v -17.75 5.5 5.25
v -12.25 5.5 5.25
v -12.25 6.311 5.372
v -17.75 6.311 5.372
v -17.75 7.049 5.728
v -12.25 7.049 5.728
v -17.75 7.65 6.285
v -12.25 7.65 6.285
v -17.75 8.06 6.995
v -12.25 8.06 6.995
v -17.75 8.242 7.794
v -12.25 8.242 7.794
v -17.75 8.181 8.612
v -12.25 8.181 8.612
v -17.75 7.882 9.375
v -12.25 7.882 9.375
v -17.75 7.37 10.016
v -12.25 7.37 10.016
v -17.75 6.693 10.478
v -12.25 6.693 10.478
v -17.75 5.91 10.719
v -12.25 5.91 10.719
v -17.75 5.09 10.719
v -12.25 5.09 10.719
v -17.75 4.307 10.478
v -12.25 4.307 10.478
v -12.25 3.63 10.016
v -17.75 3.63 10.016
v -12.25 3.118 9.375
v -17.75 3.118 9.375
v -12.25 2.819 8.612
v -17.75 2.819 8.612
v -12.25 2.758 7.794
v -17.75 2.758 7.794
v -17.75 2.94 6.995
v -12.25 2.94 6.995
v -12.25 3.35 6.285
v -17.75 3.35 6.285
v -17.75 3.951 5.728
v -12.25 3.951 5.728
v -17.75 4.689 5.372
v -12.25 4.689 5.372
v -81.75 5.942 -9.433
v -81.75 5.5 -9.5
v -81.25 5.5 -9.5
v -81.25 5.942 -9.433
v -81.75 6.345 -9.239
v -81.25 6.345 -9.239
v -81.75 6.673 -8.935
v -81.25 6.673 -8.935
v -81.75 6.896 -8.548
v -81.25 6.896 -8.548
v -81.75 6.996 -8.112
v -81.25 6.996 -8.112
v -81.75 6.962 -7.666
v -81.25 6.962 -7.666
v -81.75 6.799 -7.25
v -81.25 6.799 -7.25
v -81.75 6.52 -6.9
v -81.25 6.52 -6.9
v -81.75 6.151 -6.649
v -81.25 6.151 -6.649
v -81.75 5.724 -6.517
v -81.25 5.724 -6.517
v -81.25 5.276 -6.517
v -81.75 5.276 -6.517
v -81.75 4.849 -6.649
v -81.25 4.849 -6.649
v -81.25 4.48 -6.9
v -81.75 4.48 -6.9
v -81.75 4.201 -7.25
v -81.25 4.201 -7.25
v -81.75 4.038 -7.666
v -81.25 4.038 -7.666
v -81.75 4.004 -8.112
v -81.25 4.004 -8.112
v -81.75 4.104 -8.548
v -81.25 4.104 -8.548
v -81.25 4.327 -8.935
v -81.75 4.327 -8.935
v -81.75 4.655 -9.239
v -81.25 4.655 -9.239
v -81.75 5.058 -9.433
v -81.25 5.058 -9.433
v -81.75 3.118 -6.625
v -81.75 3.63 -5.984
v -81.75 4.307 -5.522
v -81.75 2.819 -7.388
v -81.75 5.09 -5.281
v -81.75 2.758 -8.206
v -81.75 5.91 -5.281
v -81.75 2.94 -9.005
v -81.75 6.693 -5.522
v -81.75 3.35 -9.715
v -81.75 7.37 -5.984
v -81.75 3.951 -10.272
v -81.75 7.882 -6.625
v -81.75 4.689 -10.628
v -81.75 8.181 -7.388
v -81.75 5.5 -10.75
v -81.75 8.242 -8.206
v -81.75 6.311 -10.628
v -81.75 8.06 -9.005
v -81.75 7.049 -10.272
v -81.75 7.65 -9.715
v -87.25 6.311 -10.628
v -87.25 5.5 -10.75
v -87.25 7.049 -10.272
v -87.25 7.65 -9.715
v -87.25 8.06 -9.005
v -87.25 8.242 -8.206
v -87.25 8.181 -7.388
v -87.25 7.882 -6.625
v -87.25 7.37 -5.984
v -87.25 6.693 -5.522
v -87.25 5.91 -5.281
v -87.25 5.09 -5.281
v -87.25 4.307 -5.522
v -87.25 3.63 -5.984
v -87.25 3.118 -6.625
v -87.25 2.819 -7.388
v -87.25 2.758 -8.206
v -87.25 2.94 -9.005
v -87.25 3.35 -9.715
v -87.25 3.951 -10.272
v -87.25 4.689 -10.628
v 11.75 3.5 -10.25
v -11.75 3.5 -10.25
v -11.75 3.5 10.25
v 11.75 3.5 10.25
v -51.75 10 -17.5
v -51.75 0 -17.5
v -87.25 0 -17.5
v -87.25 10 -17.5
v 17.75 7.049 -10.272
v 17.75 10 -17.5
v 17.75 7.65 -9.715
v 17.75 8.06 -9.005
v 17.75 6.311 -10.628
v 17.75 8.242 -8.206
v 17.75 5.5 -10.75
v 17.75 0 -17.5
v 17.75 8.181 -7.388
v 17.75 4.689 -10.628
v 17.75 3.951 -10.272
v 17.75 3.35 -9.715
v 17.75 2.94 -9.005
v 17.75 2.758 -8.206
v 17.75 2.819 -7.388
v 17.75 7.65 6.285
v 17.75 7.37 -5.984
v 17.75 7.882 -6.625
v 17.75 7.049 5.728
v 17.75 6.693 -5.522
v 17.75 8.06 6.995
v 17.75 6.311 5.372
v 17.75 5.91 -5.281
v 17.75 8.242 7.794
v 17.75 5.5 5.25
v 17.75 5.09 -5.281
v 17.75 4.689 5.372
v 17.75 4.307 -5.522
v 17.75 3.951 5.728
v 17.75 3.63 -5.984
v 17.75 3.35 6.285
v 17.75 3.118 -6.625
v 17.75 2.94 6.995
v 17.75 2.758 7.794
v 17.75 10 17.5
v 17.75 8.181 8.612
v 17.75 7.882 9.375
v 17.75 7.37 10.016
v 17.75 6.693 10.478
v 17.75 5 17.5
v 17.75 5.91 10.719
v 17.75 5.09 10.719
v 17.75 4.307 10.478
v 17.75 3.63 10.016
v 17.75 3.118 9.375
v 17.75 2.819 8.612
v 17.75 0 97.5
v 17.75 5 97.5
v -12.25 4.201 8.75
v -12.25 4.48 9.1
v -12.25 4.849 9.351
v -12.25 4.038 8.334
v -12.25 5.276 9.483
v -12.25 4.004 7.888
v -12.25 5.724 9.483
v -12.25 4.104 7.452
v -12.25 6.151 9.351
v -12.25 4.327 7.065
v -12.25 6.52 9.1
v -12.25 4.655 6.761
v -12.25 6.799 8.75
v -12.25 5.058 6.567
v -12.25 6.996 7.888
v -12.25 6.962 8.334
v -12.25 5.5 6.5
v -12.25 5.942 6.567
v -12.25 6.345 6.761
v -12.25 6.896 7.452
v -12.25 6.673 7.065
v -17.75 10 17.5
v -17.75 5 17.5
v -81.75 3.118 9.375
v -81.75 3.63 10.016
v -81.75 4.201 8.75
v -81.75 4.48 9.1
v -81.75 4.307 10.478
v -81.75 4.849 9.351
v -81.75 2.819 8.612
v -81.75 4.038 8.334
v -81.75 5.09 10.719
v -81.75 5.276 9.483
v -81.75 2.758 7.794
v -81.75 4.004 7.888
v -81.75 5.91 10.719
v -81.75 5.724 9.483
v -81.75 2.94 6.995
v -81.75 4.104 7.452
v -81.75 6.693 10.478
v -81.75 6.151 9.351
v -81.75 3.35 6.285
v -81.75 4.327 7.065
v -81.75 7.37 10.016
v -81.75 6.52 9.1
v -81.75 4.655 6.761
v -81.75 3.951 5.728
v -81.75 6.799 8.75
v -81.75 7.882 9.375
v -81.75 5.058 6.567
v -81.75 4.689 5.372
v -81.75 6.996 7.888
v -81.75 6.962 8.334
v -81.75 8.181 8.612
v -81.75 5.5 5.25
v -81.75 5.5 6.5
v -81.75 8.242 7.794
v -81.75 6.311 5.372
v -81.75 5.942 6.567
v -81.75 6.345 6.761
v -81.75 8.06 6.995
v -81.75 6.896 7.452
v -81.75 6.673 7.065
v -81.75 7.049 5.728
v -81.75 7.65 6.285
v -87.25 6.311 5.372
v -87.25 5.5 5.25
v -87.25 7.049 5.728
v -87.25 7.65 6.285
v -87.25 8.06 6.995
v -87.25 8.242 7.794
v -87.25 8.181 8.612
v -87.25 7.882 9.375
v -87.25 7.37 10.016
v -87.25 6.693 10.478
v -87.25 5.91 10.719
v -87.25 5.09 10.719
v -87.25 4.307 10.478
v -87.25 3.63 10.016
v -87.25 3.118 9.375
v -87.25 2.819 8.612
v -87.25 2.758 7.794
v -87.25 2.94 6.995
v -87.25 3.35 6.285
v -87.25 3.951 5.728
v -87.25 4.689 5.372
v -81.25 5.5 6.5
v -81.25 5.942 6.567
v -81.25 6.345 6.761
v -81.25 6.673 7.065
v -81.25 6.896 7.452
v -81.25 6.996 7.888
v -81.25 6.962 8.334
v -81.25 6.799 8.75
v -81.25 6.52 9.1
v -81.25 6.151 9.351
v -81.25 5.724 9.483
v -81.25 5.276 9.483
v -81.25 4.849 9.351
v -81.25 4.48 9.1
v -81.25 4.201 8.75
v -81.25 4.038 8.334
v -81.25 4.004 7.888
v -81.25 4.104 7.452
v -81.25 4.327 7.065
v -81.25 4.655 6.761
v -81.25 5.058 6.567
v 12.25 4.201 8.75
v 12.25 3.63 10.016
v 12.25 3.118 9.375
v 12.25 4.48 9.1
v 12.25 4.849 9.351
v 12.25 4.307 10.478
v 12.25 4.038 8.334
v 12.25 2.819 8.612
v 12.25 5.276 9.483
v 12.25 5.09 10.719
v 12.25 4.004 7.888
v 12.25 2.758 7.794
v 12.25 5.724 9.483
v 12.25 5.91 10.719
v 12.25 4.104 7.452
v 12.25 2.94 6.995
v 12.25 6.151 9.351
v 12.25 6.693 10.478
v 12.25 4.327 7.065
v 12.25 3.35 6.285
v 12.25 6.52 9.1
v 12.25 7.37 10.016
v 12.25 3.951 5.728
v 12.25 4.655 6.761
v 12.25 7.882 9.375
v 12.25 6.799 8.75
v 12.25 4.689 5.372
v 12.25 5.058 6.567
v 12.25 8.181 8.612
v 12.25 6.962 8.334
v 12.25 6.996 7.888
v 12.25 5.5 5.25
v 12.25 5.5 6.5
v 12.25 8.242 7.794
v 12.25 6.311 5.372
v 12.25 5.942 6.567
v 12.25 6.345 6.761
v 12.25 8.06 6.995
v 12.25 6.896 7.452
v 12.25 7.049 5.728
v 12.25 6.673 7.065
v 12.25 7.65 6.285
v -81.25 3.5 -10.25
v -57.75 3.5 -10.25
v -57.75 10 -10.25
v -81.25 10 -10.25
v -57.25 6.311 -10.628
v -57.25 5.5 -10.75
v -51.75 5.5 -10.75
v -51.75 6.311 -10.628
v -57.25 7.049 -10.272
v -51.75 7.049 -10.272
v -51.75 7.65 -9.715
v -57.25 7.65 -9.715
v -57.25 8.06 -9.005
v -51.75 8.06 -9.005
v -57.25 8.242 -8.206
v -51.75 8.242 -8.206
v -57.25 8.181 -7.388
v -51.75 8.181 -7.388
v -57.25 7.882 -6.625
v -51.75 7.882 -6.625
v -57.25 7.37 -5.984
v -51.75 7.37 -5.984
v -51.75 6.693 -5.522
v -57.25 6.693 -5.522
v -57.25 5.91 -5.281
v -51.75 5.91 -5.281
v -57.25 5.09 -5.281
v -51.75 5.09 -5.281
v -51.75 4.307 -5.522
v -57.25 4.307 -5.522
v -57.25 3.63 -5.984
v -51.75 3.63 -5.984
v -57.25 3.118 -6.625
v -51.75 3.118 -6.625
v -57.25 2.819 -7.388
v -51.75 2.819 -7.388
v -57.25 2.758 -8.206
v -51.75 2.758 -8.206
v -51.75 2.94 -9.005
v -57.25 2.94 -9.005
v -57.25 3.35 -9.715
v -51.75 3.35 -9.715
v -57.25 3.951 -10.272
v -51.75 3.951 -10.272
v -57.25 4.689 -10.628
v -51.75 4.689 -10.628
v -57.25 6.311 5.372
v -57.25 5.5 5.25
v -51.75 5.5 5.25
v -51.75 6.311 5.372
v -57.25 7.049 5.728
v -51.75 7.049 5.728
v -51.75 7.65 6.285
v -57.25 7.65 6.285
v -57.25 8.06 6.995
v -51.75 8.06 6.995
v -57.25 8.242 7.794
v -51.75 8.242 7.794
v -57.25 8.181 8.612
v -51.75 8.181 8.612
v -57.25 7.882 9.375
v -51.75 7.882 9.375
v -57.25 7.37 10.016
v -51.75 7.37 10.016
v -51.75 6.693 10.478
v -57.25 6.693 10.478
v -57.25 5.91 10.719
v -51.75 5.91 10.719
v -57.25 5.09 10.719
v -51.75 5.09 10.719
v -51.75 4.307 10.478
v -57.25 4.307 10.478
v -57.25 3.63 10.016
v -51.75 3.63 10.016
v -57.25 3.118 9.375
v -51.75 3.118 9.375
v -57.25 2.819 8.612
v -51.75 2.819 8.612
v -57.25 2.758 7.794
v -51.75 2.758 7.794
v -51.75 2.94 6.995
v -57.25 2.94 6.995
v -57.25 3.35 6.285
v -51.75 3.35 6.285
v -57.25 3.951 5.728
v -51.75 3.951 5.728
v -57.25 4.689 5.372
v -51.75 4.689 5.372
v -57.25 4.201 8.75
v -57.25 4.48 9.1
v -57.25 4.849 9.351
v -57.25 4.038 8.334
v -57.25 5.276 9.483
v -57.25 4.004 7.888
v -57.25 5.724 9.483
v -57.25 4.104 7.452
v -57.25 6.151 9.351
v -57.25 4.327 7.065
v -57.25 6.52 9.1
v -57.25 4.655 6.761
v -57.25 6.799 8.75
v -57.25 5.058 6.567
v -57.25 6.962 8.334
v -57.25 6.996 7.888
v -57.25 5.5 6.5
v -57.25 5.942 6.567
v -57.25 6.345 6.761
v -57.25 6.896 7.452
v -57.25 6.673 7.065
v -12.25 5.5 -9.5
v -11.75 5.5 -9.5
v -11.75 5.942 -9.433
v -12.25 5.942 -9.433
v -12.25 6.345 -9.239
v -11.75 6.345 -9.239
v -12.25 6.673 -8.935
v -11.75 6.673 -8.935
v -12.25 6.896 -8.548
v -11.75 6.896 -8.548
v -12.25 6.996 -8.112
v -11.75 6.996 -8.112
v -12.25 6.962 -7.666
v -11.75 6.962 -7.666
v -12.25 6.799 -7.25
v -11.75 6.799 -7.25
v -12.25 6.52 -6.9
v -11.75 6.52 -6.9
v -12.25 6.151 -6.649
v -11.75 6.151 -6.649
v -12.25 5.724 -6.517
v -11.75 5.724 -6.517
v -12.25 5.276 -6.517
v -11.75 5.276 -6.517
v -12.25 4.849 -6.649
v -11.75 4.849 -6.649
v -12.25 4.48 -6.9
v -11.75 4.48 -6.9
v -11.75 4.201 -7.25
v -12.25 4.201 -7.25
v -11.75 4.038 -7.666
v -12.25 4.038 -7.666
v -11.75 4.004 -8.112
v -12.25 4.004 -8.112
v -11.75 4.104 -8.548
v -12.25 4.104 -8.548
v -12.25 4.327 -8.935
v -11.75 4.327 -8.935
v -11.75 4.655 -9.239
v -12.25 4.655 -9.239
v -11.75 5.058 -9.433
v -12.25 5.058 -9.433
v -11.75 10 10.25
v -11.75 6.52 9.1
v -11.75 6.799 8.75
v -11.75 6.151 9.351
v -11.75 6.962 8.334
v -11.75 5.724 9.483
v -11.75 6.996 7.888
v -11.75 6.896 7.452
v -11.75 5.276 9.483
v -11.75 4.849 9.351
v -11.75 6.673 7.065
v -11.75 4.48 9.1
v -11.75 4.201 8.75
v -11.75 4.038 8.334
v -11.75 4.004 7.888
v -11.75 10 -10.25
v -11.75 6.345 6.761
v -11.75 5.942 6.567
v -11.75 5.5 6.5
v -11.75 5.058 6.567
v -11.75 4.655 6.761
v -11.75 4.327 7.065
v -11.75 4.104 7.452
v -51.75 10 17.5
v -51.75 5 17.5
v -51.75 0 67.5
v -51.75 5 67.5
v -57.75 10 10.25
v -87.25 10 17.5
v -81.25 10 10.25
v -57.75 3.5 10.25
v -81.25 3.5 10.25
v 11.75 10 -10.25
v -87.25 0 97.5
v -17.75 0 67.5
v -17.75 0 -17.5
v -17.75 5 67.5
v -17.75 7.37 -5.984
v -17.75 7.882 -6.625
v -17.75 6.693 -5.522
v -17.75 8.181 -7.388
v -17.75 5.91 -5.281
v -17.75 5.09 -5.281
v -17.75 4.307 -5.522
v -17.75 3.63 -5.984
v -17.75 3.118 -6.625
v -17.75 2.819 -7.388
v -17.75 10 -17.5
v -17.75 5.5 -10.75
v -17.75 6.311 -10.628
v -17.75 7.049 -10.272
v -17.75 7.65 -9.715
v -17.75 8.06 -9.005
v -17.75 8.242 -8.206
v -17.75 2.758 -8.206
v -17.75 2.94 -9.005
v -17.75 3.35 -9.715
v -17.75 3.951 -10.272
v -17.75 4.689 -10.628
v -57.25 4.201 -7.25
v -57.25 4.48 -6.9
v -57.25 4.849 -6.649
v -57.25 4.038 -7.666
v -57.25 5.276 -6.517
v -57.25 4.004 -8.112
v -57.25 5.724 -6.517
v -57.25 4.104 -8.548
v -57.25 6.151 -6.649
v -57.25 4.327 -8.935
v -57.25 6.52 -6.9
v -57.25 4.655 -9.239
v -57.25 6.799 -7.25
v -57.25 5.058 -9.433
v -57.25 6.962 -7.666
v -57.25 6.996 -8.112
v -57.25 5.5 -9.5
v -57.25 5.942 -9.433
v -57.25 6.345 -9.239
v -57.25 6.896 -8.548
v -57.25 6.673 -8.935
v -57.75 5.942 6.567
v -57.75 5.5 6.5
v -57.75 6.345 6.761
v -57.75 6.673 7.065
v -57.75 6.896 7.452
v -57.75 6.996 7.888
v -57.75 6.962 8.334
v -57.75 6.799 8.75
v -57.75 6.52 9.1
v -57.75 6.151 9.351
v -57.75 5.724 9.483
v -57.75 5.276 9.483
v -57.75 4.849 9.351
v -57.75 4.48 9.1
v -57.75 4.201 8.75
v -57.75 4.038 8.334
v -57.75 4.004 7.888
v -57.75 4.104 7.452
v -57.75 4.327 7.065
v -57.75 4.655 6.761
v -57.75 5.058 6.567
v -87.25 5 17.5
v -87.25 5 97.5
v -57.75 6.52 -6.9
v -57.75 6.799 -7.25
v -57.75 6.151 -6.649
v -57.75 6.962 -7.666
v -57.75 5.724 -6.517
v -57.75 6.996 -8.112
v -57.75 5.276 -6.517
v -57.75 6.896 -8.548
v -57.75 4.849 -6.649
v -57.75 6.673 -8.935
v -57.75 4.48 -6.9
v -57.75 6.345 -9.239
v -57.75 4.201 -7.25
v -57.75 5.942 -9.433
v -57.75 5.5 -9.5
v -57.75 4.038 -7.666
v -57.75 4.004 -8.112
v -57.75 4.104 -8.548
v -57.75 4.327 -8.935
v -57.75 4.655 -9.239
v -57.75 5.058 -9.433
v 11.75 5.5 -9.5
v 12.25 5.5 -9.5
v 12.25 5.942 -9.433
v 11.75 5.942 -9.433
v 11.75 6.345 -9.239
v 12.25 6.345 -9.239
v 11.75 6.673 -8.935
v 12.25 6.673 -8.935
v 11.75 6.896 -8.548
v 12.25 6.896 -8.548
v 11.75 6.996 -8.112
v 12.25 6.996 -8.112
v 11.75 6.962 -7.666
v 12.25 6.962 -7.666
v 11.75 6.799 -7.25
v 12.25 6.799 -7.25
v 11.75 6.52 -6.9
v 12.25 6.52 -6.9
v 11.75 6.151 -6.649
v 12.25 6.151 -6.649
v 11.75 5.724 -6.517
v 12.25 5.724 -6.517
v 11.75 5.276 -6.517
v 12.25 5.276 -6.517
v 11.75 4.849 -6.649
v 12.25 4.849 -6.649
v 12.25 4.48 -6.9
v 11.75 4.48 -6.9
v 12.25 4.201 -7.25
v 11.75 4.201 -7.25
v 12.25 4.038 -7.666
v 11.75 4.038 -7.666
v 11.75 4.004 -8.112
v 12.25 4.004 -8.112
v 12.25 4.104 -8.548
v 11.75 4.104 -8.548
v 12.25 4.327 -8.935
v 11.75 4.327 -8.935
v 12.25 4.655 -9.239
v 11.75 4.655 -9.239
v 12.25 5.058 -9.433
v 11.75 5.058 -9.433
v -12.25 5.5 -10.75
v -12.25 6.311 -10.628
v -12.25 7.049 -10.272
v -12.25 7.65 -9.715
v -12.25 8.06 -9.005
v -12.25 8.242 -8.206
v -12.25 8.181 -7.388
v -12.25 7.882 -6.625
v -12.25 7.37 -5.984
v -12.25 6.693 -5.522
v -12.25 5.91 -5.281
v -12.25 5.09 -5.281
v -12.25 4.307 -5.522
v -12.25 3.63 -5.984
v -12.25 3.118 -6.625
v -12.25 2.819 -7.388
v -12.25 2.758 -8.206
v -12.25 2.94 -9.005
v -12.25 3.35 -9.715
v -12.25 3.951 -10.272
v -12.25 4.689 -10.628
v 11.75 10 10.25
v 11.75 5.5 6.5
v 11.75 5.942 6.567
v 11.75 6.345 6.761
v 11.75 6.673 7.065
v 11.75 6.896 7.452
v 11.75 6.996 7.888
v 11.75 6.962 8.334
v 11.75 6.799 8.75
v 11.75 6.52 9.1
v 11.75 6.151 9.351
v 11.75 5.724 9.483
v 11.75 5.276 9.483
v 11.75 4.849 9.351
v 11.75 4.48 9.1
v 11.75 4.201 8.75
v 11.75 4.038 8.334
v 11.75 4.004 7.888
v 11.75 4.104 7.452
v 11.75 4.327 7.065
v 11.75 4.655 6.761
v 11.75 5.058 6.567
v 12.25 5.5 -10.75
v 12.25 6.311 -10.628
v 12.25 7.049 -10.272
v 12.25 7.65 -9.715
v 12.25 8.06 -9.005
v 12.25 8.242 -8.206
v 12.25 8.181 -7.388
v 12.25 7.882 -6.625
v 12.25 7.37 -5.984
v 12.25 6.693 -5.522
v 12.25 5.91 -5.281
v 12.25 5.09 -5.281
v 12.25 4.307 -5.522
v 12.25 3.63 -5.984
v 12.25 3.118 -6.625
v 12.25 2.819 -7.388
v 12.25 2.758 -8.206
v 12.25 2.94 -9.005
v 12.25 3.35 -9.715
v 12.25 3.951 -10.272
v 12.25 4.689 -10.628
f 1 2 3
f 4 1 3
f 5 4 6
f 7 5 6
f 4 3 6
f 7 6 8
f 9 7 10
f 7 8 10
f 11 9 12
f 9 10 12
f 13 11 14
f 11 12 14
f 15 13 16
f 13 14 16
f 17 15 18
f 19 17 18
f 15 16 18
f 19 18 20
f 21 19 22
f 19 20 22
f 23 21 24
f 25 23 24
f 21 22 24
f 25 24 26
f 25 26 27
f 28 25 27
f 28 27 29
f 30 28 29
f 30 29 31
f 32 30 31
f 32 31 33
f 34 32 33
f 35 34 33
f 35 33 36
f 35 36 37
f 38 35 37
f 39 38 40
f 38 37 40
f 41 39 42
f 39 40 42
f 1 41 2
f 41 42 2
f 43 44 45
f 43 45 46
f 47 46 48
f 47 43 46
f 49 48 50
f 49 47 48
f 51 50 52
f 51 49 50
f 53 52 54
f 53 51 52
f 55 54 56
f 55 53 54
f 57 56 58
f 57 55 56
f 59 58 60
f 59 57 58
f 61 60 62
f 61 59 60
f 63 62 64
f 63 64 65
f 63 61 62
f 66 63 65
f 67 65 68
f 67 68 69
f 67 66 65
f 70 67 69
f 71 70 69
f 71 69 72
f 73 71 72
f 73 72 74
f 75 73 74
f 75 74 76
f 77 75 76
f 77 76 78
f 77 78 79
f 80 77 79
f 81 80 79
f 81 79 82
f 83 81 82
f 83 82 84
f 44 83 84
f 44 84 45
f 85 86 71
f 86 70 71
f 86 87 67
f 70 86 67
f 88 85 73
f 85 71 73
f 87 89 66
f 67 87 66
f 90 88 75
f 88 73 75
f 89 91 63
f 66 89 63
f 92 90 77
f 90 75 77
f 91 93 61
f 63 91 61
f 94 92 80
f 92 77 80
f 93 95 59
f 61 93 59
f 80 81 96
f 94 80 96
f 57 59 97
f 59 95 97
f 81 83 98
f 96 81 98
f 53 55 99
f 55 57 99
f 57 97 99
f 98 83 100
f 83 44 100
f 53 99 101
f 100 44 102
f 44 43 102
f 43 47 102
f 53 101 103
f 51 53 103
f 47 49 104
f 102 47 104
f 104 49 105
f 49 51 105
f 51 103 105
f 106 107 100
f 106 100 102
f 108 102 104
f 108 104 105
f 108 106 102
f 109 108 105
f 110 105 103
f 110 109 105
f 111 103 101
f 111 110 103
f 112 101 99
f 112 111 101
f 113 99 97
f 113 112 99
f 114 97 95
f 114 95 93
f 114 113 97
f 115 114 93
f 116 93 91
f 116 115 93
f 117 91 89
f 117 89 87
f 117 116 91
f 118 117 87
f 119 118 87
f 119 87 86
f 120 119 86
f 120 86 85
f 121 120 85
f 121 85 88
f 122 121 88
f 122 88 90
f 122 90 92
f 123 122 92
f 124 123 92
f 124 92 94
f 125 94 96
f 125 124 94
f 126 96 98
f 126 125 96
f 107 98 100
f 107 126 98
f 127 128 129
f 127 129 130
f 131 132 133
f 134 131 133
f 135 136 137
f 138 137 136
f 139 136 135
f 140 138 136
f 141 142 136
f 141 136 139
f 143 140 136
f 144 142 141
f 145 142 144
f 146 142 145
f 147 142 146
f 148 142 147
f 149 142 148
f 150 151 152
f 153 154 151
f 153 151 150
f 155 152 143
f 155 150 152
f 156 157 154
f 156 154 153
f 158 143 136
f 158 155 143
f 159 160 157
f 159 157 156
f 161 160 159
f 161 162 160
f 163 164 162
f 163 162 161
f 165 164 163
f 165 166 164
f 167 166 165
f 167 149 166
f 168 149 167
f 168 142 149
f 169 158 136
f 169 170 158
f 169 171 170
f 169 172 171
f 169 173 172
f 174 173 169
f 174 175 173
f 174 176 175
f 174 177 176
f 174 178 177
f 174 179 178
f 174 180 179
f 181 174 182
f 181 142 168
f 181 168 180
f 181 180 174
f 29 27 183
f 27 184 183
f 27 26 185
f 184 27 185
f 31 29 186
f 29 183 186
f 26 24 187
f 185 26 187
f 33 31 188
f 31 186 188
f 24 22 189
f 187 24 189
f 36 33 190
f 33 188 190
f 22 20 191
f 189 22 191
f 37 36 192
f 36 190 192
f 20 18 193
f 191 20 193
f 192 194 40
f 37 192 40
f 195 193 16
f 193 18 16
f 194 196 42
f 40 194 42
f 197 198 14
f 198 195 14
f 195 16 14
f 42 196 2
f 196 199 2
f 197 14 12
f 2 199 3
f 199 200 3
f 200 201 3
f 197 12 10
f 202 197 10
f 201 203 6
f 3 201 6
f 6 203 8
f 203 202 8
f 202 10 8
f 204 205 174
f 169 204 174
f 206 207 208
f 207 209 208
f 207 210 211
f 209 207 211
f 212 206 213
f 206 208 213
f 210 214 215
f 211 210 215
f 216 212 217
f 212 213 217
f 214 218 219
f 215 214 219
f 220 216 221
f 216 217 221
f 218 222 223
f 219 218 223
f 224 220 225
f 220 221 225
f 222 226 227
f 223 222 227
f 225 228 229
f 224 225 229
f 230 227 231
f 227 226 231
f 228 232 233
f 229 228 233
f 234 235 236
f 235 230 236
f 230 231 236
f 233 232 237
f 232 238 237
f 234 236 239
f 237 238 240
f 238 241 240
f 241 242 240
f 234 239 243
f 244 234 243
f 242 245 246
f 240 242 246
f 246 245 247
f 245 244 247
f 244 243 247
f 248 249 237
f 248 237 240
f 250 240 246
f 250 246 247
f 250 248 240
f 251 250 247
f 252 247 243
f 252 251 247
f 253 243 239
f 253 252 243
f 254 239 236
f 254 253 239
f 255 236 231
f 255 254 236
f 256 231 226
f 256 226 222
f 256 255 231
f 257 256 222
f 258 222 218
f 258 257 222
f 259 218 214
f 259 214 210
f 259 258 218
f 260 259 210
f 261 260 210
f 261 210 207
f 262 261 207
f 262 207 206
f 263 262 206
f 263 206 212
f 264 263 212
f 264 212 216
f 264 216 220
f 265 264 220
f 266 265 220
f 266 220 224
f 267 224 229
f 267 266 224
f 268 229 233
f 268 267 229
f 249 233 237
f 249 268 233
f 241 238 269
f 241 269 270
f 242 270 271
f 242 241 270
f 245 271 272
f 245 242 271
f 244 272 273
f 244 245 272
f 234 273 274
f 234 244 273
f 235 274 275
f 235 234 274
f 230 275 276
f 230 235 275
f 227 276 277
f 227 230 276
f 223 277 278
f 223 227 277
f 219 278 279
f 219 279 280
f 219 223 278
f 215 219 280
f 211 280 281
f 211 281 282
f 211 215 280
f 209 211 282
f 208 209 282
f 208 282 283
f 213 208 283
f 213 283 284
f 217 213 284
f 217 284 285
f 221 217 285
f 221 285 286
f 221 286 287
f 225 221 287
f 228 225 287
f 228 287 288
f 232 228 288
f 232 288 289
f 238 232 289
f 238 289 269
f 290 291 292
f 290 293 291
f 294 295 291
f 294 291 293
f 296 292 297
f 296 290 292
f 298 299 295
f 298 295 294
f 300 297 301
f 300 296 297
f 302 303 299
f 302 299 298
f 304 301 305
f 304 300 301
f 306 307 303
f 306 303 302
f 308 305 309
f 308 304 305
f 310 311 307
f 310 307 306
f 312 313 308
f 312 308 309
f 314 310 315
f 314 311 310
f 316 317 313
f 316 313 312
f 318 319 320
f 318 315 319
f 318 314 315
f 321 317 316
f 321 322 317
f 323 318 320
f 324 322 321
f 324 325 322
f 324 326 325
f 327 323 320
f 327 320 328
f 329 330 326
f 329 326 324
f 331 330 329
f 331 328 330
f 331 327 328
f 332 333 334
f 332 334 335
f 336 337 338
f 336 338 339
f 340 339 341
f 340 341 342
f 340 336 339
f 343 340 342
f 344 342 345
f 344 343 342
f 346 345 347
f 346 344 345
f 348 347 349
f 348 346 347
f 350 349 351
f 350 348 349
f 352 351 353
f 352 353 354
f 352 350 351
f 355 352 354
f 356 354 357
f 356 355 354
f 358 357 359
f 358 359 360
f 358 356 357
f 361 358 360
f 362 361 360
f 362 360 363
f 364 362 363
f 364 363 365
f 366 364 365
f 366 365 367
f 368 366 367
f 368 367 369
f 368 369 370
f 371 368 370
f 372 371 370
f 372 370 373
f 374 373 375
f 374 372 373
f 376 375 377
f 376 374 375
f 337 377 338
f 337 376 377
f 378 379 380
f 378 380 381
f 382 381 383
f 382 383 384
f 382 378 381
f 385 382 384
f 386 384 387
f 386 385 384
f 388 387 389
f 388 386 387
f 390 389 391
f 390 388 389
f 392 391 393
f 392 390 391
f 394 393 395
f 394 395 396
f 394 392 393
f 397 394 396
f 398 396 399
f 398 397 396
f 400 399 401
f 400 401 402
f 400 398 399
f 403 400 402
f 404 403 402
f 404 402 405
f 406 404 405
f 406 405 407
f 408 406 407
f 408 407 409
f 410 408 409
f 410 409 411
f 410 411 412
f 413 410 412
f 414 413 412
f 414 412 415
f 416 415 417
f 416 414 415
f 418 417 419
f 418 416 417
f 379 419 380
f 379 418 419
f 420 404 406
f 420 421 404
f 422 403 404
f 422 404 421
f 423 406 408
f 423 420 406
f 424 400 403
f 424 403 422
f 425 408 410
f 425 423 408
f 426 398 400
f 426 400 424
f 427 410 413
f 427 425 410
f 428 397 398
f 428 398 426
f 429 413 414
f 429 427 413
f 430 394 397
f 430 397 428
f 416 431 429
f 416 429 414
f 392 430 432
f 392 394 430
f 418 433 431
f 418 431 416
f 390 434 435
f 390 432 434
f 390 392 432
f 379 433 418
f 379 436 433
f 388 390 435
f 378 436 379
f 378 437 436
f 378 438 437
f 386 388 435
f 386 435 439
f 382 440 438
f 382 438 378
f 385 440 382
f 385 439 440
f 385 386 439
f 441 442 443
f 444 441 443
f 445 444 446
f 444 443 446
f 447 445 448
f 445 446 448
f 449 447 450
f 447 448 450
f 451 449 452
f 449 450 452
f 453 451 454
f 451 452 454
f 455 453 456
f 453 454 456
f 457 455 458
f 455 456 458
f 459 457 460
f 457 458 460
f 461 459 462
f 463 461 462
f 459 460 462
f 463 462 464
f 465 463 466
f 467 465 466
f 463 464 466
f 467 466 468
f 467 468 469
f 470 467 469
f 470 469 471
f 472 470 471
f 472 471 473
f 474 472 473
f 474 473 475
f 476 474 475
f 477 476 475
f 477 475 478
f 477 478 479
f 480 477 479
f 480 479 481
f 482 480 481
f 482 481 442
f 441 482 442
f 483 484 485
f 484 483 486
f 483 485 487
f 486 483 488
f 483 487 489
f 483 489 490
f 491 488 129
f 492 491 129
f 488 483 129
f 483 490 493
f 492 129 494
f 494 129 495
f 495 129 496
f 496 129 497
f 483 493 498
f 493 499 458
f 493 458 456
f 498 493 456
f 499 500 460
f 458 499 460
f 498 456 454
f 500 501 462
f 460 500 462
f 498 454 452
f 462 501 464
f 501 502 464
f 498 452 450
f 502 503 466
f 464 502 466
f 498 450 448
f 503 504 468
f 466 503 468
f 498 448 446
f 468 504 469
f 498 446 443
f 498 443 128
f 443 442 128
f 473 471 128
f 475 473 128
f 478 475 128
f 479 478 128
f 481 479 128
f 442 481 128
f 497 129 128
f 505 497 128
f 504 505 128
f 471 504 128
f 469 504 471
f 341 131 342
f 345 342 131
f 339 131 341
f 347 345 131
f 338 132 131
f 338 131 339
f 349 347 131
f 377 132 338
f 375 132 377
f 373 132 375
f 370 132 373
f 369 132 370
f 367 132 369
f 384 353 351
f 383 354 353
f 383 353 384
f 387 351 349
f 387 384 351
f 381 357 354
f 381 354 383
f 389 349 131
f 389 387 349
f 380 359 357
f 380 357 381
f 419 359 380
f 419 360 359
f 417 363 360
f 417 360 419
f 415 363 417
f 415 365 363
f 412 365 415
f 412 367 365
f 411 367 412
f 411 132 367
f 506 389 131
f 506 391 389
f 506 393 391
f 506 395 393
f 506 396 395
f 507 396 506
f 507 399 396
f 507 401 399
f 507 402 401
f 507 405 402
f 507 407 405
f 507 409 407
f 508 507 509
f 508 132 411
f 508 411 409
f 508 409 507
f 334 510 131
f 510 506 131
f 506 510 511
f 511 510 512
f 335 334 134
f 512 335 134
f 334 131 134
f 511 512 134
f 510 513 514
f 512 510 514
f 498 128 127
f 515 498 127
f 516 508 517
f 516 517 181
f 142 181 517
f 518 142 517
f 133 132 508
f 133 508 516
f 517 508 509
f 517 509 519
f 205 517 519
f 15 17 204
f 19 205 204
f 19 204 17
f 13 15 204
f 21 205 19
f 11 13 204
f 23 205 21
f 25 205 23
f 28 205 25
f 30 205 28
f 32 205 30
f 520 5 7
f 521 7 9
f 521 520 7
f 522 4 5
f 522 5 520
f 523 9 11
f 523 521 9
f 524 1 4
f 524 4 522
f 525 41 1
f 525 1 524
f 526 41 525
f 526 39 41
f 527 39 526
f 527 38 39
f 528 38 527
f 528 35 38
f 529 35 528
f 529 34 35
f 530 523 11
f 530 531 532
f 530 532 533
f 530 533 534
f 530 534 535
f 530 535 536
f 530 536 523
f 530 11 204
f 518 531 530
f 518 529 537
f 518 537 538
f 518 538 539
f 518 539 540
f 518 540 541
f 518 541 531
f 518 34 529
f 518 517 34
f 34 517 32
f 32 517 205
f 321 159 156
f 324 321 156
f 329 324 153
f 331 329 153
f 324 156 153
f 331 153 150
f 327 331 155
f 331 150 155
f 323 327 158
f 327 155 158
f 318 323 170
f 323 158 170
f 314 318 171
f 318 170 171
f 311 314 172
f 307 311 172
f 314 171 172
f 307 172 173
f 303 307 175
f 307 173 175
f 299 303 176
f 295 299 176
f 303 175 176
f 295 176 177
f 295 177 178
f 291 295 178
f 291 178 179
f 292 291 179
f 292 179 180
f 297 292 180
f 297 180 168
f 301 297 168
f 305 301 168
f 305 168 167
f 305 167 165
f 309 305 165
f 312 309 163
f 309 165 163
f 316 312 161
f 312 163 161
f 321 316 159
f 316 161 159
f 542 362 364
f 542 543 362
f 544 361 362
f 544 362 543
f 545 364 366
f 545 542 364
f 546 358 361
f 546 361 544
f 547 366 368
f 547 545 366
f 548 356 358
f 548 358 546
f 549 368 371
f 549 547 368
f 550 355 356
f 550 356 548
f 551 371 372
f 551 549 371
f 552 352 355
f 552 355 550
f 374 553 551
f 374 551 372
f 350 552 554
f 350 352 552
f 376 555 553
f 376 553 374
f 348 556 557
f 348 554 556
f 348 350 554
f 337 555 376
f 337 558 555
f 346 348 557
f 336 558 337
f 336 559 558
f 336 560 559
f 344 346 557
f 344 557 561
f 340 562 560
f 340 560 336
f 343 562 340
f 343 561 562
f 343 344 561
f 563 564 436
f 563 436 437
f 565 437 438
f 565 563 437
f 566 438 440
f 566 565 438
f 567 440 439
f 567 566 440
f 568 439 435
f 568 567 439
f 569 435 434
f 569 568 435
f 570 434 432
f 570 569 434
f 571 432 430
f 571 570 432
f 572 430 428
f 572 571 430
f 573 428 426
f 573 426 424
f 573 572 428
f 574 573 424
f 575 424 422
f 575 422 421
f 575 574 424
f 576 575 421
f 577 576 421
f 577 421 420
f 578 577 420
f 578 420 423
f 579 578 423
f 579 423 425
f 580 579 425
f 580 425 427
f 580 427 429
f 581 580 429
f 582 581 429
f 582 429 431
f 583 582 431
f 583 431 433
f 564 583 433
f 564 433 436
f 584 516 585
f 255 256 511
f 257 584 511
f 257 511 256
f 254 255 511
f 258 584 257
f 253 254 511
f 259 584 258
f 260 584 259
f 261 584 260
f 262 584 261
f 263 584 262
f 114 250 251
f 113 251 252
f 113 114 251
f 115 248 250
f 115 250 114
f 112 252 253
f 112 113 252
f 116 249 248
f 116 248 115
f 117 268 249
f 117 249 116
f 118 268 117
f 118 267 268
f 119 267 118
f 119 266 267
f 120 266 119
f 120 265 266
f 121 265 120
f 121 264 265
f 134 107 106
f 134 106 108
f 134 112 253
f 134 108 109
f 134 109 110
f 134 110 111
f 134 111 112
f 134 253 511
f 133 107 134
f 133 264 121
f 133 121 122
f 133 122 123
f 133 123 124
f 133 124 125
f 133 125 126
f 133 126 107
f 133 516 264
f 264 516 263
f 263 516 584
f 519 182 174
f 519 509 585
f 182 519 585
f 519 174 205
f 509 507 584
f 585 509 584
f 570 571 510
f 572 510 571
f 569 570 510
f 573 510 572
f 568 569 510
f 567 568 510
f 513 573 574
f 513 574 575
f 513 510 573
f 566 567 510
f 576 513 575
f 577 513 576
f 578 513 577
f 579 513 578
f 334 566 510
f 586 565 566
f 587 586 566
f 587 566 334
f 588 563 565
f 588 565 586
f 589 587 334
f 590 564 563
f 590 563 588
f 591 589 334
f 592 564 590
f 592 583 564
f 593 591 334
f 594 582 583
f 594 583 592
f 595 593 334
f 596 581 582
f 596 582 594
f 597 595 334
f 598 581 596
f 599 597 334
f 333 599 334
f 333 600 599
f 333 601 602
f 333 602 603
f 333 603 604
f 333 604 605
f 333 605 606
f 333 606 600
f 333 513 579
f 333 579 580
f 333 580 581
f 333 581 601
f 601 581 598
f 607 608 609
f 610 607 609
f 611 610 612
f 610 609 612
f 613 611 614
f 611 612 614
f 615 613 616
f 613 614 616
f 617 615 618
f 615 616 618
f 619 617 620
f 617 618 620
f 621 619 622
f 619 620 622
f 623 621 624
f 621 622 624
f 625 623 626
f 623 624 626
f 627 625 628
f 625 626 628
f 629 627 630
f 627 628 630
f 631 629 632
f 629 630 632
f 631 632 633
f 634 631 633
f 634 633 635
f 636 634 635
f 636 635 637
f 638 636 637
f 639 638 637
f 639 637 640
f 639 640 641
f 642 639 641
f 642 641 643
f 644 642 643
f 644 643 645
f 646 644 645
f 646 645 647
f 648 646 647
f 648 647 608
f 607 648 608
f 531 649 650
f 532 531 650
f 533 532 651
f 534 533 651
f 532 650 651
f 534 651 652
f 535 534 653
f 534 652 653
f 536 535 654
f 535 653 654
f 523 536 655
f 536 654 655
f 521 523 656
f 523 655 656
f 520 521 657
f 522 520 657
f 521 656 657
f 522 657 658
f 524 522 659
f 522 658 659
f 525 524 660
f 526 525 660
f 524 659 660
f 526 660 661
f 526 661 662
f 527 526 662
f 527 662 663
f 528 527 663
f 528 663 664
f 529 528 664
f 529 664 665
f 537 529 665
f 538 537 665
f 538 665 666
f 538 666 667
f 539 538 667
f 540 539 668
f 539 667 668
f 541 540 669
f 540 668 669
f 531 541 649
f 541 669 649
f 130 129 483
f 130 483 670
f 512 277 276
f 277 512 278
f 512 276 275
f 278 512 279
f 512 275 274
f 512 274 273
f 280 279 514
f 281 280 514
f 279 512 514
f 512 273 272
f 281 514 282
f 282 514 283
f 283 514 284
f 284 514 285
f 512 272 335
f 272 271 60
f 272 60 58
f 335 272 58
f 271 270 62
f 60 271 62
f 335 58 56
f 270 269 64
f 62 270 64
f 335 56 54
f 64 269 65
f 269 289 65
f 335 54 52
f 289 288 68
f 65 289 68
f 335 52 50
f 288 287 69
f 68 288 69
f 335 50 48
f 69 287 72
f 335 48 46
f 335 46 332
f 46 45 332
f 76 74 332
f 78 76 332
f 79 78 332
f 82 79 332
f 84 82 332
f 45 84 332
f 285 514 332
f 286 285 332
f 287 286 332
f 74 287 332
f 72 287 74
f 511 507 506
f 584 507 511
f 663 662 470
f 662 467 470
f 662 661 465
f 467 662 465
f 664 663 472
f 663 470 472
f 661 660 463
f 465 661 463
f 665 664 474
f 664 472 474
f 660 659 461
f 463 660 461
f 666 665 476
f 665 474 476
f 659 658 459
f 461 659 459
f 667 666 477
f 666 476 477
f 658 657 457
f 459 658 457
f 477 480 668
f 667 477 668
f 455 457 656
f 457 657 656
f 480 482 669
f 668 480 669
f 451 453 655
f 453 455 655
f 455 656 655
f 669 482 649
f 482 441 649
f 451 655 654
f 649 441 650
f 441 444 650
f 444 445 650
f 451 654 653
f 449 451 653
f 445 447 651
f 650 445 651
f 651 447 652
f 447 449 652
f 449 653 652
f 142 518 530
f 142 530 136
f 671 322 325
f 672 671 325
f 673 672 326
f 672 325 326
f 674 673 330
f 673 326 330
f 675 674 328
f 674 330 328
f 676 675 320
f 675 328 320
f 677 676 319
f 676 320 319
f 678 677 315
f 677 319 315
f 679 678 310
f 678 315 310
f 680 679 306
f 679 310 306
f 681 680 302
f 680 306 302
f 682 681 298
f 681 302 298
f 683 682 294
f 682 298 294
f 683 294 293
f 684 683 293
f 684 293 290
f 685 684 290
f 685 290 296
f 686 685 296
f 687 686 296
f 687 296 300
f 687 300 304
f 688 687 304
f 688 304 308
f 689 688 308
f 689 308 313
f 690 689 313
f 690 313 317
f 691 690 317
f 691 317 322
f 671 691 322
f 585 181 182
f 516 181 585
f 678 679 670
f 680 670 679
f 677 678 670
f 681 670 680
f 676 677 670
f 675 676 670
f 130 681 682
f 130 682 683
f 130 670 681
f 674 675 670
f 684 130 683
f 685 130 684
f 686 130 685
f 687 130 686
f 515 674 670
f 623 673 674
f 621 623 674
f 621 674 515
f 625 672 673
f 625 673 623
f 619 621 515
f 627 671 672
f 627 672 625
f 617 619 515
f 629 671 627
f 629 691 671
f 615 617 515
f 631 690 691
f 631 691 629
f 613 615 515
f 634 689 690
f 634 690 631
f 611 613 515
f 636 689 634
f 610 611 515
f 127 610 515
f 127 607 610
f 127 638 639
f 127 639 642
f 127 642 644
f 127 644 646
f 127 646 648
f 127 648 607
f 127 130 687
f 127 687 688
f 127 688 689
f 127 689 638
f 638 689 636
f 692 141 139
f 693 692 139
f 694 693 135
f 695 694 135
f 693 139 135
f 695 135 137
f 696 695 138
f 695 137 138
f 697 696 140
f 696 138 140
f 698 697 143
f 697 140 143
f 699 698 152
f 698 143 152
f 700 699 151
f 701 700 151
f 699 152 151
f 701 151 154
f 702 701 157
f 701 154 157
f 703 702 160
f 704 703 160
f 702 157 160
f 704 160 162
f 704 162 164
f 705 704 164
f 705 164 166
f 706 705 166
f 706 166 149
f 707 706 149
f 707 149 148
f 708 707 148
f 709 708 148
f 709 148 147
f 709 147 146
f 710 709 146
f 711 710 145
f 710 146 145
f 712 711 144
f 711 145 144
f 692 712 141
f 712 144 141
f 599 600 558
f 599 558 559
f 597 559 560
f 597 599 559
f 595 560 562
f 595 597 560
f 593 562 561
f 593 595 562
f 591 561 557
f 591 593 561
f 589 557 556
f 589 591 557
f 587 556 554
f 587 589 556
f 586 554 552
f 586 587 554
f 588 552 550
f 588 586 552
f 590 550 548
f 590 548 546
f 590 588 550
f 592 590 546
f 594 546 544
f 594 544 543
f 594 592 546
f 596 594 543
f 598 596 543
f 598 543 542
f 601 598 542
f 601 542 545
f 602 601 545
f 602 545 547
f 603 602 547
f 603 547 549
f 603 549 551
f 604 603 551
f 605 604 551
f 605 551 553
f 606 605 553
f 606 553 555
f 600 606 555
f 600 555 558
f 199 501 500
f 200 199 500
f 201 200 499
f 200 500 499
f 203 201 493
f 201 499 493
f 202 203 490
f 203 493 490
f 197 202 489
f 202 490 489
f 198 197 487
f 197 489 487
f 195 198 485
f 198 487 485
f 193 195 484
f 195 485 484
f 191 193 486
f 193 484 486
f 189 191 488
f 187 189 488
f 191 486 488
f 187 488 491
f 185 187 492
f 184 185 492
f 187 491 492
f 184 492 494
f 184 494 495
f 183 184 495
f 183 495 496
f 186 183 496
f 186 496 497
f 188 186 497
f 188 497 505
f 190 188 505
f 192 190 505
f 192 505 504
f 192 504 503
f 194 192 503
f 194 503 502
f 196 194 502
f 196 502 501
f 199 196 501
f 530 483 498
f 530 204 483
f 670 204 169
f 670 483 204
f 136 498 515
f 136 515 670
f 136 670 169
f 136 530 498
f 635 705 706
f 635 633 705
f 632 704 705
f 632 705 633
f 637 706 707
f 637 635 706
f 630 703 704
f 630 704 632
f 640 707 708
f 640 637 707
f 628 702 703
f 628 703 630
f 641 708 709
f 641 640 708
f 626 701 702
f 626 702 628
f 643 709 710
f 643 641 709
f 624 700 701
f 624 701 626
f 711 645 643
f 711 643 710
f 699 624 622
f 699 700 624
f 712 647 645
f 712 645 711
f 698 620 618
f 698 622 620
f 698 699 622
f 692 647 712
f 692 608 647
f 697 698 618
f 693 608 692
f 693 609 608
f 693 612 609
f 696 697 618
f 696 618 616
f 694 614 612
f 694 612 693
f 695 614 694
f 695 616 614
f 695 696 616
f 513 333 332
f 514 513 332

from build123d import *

# Parameters (mm, degrees)
SKETCH1_W           = 35.5
SKETCH1_H           = 35
SKETCH1_W_2         = 23.5
SKETCH1_H_2         = 20.5
BOSS_EXTRUDE1_DEPTH = 10
SKETCH1_2_W         = 23.5
SKETCH1_2_H         = 20.5
BOSS_EXTRUDE2_DEPTH = 3.5
SKETCH2_R           = 2.75
SKETCH2_R_2         = 1.5
CUT_EXTRUDE1_DEPTH  = 5.5
SKETCH2_2_R         = 1.5
CUT_EXTRUDE2_DEPTH  = 41.822787754
CUT_EXTRUDE3_START  = -30
SKETCH2_3_R         = 2.75
SKETCH2_3_R_2       = 1.5
CUT_EXTRUDE3_DEPTH  = 5.5
BOSS_EXTRUDE3_DEPTH = 5


with BuildPart() as part:
    # Sketch1 → Boss-Extrude1 (new body)
    with BuildSketch(Plane(origin=(0, 0, 0), x_dir=(1, 0, 0), z_dir=(0, 1, 0))):
        Rectangle(SKETCH1_W, SKETCH1_H)
        Rectangle(SKETCH1_W_2, SKETCH1_H_2, mode=Mode.SUBTRACT)
    extrude(amount=BOSS_EXTRUDE1_DEPTH)

    # Sketch1<2> → Boss-Extrude2 (add)
    with BuildSketch(Plane(origin=(0, 0, 0), x_dir=(1, 0, 0), z_dir=(0, 1, 0))):
        Rectangle(SKETCH1_2_W, SKETCH1_2_H)
    extrude(amount=BOSS_EXTRUDE2_DEPTH)

    # Sketch2 → Cut-Extrude1 (cut)
    # profile 1 of 2: a face of its own
    with BuildSketch(Plane(origin=(17.75, 0, 0), x_dir=(0, 0, -1), z_dir=(1, 0, 0))):
        with Locations((-8, 5.5)):
            Circle(SKETCH2_R)
        with Locations((-8, 5.5)):
            Circle(SKETCH2_R_2, mode=Mode.SUBTRACT)
    # profile 2 of 2: a face of its own
    with BuildSketch(Plane(origin=(17.75, 0, 0), x_dir=(0, 0, -1), z_dir=(1, 0, 0))):
        with Locations((8, 5.5)):
            Circle(SKETCH2_R)
        with Locations((8, 5.5)):
            Circle(SKETCH2_R_2, mode=Mode.SUBTRACT)
    extrude(amount=-CUT_EXTRUDE1_DEPTH, mode=Mode.SUBTRACT)

    # Sketch2<2> → Cut-Extrude2 (cut, through all)
    with BuildSketch(Plane(origin=(17.75, 0, 0), x_dir=(0, 0, -1), z_dir=(1, 0, 0))):
        with Locations((-8, 5.5)):
            Circle(SKETCH2_2_R)
        with Locations((8, 5.5)):
            Circle(SKETCH2_2_R)
    extrude(amount=-CUT_EXTRUDE2_DEPTH, mode=Mode.SUBTRACT)

    # Sketch2<3> → Cut-Extrude3 (cut)
    # profile 1 of 2: a face of its own
    with BuildSketch(Plane(origin=(17.75, 0, 0), x_dir=(0, 0, -1), z_dir=(1, 0, 0)).offset(CUT_EXTRUDE3_START)):
        with Locations((-8, 5.5)):
            Circle(SKETCH2_3_R)
        with Locations((-8, 5.5)):
            Circle(SKETCH2_3_R_2, mode=Mode.SUBTRACT)
    # profile 2 of 2: a face of its own
    with BuildSketch(Plane(origin=(17.75, 0, 0), x_dir=(0, 0, -1), z_dir=(1, 0, 0)).offset(CUT_EXTRUDE3_START)):
        with Locations((8, 5.5)):
            Circle(SKETCH2_3_R)
        with Locations((8, 5.5)):
            Circle(SKETCH2_3_R_2, mode=Mode.SUBTRACT)
    extrude(amount=-CUT_EXTRUDE3_DEPTH, mode=Mode.SUBTRACT)


with BuildPart() as body_2:
    # Mirror1: mirrored copy
    add(part.part.mirror(Plane.ZY.offset(34.75)))


with BuildPart() as part_1:
    add(part.part)

    add(body_2.part)  # Boss-Extrude3 merges body 2
    # Sketch4 → Boss-Extrude3 (add)
    with BuildSketch(Plane(origin=(0, 0, 0), x_dir=(1, 0, 0), z_dir=(0, 1, 0))):
        Polygon((-51.75, -17.5), (-51.75, -67.5), (-17.75, -67.5), (-17.75, -17.5), (17.75, -17.5), (17.75, -97.5), (-87.25, -97.5), (-87.25, -17.5), align=None)
    extrude(amount=BOSS_EXTRUDE3_DEPTH)


solid = part_1.part
